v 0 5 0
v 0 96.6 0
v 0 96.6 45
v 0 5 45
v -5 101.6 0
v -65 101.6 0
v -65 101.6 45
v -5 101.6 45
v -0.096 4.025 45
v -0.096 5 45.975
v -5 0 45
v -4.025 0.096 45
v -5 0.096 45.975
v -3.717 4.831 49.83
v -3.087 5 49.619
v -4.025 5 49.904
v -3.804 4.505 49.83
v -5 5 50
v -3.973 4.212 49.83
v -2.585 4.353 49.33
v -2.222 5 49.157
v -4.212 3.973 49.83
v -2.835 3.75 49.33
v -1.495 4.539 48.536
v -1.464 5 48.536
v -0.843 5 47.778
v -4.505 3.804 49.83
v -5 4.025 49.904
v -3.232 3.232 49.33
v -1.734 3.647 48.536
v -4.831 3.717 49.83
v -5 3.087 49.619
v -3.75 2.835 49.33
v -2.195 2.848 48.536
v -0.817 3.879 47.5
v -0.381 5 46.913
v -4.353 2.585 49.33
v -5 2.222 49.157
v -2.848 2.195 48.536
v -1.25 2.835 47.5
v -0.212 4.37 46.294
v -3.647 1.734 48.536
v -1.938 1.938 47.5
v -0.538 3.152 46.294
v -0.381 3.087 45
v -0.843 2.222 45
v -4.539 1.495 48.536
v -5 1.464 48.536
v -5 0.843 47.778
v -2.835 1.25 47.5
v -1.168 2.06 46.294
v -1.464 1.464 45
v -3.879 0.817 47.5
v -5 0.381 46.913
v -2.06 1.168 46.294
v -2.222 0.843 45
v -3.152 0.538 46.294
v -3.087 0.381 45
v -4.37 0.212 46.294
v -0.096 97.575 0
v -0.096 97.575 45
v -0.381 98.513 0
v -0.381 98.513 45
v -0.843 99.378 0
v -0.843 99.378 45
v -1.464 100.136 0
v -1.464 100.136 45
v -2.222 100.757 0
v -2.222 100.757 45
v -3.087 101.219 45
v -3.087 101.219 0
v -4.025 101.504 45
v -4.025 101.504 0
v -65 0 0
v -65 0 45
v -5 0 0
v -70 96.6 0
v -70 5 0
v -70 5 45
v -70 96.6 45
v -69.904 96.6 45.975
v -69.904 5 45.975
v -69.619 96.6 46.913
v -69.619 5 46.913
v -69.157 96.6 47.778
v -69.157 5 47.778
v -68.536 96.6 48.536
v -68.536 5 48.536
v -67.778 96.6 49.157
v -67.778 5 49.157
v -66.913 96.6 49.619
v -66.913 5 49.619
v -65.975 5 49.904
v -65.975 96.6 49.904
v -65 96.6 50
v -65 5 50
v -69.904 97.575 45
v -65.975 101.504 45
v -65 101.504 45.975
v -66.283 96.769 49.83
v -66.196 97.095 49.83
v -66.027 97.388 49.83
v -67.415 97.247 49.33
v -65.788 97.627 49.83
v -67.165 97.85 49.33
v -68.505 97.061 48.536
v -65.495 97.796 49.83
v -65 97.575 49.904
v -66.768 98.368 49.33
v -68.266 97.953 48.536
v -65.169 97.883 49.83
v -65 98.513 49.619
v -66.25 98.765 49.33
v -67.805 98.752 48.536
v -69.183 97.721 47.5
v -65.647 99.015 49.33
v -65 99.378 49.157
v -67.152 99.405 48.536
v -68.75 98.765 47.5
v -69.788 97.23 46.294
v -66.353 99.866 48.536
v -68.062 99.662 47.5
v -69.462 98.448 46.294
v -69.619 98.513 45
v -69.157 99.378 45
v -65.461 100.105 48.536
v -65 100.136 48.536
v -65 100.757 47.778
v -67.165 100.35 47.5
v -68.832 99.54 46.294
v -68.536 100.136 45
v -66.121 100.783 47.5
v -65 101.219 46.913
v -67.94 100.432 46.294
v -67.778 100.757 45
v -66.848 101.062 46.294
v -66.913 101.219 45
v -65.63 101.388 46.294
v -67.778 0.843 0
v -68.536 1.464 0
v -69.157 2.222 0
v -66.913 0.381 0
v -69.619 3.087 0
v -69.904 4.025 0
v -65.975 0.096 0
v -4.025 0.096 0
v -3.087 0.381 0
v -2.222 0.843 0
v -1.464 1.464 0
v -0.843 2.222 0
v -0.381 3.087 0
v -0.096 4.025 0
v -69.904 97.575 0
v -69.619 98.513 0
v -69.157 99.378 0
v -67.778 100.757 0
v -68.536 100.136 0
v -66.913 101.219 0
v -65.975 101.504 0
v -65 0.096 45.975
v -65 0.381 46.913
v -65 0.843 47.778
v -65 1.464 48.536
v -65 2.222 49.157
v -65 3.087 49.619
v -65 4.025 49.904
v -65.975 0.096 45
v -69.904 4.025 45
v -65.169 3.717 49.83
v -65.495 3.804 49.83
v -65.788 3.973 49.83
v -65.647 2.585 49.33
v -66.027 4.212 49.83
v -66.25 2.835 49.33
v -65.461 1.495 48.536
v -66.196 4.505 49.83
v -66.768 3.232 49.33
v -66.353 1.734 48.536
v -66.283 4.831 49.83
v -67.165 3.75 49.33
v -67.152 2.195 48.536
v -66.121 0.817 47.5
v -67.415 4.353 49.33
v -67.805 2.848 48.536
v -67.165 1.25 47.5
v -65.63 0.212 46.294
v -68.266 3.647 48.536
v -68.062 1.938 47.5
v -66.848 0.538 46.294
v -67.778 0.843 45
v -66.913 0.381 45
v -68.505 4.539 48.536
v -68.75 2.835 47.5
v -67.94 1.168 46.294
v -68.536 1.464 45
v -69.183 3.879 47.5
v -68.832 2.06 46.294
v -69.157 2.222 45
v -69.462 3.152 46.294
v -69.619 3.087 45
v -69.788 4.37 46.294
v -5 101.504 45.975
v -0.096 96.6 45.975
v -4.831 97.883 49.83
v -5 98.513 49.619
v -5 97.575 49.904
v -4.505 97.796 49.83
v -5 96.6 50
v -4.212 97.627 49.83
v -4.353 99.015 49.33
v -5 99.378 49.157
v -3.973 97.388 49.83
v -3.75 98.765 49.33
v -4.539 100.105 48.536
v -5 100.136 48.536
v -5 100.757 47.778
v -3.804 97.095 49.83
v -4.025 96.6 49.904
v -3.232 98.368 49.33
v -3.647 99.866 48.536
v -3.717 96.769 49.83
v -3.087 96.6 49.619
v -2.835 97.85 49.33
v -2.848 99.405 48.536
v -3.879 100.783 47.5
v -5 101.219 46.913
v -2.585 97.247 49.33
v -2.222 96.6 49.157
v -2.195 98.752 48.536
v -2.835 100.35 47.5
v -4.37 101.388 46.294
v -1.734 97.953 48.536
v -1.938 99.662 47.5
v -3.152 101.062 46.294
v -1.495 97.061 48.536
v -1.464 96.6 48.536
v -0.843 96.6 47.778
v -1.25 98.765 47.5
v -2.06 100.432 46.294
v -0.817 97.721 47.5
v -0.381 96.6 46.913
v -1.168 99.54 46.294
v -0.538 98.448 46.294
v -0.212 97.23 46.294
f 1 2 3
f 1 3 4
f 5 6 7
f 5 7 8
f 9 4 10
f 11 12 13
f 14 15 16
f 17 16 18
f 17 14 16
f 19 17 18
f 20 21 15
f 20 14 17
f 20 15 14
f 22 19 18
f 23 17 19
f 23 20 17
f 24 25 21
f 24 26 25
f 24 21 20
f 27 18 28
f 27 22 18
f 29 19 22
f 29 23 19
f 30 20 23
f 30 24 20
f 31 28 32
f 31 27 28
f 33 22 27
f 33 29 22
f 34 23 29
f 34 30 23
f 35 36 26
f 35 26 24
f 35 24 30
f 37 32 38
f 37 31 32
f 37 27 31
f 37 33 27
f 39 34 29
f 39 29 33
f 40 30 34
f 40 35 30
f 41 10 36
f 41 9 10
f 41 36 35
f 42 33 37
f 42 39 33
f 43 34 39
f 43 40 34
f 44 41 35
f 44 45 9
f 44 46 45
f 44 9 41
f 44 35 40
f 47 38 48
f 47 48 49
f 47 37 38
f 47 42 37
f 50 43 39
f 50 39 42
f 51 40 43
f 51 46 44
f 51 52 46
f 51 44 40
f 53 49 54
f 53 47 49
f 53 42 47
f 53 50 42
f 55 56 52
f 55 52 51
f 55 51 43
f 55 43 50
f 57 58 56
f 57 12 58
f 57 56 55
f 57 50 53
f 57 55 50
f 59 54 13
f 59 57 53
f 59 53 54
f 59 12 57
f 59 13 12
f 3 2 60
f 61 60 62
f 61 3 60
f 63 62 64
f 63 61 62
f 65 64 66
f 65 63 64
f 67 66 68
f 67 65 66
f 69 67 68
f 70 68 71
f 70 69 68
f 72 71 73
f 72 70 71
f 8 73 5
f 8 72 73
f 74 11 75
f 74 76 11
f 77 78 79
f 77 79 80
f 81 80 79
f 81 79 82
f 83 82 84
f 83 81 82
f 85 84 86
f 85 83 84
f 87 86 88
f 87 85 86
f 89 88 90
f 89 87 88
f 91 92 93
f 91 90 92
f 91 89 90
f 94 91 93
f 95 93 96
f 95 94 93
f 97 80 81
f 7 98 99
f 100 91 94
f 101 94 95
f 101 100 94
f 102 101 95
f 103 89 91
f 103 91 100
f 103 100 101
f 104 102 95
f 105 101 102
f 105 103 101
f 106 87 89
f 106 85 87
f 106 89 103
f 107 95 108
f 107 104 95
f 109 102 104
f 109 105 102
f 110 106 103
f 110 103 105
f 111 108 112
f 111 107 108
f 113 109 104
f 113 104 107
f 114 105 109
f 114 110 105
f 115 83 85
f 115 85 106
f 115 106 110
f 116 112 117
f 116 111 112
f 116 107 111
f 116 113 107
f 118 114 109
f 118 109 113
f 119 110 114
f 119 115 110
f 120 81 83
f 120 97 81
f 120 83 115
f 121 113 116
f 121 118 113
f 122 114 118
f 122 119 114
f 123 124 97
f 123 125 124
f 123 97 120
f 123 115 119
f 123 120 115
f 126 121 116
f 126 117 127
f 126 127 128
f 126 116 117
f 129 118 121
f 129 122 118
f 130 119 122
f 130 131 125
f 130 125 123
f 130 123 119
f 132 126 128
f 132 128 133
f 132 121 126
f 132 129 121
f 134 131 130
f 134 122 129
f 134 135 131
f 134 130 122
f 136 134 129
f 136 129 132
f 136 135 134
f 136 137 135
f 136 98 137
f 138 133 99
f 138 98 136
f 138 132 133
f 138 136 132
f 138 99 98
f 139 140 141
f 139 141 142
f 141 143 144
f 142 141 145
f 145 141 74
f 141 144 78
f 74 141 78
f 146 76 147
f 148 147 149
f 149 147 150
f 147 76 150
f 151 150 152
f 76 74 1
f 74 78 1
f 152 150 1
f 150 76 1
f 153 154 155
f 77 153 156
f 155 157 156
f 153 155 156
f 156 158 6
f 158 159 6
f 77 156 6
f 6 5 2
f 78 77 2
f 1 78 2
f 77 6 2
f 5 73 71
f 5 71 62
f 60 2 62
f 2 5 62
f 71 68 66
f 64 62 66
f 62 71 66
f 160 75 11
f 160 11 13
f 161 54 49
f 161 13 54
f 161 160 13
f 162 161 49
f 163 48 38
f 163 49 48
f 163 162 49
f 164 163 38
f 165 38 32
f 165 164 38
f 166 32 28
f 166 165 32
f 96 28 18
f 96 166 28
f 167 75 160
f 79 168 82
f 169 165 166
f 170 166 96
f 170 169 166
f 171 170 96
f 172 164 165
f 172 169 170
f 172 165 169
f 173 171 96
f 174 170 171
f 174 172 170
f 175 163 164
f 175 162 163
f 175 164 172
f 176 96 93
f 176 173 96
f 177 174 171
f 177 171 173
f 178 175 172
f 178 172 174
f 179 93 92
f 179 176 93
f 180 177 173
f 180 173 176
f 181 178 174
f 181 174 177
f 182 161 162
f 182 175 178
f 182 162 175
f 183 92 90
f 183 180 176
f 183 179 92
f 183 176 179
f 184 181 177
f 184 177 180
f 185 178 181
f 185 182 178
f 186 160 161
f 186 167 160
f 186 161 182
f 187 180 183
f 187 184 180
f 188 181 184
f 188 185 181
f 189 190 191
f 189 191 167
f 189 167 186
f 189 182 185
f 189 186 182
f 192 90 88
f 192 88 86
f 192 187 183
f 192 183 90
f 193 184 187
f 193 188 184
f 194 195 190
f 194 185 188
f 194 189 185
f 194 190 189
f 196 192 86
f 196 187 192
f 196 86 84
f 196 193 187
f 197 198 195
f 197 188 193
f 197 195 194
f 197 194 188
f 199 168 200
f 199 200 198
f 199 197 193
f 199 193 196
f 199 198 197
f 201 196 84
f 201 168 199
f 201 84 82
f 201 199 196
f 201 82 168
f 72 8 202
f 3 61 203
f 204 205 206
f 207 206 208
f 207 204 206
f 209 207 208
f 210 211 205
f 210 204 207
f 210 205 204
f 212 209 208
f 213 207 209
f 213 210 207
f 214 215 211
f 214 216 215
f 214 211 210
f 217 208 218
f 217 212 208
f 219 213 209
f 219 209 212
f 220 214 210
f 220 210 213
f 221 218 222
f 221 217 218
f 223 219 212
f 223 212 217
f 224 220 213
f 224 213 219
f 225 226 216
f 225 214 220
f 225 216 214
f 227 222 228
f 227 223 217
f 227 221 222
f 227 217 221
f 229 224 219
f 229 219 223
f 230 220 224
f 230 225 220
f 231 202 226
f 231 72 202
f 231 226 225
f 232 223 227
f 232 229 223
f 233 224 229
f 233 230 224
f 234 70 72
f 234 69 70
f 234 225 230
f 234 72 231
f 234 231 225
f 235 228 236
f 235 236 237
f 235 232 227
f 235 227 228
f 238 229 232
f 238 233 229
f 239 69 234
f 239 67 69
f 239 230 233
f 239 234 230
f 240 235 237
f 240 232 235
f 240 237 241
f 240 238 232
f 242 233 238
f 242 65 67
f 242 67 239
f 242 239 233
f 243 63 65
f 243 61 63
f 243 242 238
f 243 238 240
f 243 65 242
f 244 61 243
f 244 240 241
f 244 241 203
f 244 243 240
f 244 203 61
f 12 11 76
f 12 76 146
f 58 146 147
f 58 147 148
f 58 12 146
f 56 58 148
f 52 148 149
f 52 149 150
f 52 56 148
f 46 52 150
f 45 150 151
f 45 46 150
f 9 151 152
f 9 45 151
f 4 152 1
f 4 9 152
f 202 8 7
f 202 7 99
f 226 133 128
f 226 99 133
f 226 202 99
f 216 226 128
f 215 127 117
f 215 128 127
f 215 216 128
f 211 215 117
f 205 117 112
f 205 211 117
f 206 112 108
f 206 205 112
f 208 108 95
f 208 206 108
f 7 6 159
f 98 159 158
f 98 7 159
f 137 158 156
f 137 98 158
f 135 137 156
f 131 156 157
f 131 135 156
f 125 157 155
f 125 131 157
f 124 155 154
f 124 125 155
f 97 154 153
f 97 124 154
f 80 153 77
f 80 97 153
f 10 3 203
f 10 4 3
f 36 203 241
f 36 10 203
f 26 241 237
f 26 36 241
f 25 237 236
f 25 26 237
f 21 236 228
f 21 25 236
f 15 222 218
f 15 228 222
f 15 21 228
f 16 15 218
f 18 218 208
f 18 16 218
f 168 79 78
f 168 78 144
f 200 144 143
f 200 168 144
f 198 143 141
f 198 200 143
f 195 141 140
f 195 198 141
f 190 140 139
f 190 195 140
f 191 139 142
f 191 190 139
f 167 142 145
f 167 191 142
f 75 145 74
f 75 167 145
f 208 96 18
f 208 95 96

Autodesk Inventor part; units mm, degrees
ref_plane "YZ Plane" through (0, 0, 0) normal (1, 0, 0) x (0, 1, 0)
ref_plane "XZ Plane" through (0, 0, 0) normal (0, 1, 0) x (-1, 0, 0)
ref_plane "XY Plane" through (0, 0, 0) normal (0, 0, 1) x (1, 0, 0)
sketch "Sketch1" plane through (0, 0, 0) normal (0, 0, 1) x (1, 0, 0)
  line L0 (0, 0) -> (-70, 0)
  line L1 (-70, 0) -> (-70, 101.6)
  line L2 (-70, 101.6) -> (0, 101.6)
  line L3 (0, 101.6) -> (0, 0)
  dimension "d0" = 70
  dimension "d1" = 101.6
extrude "Extrusion1" add sketch "Sketch1" along normal blind 50
fillet "Fillet1" radius 5 8 edges at (-70, 0, 25) (0, 0, 25) (-70, 101.6, 25) (0, 101.6, 25) (-70, 50.8, 50) (-35, 101.6, 50) (0, 50.8, 50) (-35, 0, 50)
sketch "Sketch2" plane through (0, 0, 50) normal (0, 0, 1) x (1, 0, 0)
  point P0 (0, 0)
properties part number "box" material "Glass"
